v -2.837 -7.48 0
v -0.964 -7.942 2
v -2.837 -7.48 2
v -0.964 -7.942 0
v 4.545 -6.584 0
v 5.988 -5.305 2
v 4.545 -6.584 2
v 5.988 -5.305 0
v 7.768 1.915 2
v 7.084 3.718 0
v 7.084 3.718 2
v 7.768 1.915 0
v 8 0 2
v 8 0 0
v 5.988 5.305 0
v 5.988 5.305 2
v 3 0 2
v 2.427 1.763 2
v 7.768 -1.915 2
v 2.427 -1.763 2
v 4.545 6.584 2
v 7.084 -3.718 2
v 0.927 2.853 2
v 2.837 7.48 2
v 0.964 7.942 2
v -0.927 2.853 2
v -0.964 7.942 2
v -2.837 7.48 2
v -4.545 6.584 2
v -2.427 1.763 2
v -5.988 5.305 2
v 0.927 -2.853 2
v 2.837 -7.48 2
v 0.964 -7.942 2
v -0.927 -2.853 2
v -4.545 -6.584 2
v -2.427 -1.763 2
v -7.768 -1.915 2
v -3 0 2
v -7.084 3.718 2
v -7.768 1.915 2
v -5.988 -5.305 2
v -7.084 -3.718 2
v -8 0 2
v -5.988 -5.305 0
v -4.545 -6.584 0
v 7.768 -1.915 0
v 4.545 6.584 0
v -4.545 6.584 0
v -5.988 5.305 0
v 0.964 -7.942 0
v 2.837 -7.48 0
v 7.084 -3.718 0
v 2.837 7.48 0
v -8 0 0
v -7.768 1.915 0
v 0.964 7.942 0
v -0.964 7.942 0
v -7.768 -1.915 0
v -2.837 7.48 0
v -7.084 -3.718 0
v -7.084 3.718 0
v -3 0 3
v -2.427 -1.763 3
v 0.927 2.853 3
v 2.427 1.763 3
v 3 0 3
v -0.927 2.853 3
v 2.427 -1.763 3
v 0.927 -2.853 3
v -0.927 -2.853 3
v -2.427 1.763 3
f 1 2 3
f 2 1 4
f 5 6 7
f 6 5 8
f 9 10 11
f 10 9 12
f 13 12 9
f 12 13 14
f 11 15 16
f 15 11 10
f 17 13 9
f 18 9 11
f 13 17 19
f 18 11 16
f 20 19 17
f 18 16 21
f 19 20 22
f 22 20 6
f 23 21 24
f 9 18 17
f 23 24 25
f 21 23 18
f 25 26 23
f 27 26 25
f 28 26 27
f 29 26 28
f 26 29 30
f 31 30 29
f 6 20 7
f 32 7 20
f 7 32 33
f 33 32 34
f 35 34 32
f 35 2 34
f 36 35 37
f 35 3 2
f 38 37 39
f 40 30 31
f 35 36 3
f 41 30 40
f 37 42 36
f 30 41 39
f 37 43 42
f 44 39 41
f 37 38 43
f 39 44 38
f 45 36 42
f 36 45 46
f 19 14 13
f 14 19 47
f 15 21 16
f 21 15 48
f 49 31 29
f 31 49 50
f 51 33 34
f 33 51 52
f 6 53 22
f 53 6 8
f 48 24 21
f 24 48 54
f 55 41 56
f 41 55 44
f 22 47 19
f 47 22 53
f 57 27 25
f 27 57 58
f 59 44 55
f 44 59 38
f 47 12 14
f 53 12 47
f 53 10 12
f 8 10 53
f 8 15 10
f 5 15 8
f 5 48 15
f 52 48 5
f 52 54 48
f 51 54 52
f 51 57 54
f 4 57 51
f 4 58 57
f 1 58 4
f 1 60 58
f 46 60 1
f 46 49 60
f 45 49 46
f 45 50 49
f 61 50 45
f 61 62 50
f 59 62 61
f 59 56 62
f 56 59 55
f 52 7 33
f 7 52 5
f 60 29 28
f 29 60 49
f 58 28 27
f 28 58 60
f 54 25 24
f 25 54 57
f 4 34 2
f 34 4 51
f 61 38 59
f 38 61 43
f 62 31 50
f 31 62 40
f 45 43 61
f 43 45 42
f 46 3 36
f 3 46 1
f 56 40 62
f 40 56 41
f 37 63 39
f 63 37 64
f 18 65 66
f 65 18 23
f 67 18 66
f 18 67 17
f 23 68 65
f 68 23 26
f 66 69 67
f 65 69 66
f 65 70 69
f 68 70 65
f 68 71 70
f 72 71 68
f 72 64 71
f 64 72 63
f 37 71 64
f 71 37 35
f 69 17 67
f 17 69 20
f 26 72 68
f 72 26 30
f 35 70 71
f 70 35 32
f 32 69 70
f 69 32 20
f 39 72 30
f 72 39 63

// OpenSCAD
//:Model eye_outside [1,1,1]
module eye_outside()
{
    color([255,255,255])
    cylinder(r=8, h=2);
}

//:Model eye_inside [0,0,0]
module eye_inside()
{
    color([0,0,0])
    cylinder(r=3, h=3);
}

module eye()
{
 eye_outside();
 eye_inside();   
}

eye();
